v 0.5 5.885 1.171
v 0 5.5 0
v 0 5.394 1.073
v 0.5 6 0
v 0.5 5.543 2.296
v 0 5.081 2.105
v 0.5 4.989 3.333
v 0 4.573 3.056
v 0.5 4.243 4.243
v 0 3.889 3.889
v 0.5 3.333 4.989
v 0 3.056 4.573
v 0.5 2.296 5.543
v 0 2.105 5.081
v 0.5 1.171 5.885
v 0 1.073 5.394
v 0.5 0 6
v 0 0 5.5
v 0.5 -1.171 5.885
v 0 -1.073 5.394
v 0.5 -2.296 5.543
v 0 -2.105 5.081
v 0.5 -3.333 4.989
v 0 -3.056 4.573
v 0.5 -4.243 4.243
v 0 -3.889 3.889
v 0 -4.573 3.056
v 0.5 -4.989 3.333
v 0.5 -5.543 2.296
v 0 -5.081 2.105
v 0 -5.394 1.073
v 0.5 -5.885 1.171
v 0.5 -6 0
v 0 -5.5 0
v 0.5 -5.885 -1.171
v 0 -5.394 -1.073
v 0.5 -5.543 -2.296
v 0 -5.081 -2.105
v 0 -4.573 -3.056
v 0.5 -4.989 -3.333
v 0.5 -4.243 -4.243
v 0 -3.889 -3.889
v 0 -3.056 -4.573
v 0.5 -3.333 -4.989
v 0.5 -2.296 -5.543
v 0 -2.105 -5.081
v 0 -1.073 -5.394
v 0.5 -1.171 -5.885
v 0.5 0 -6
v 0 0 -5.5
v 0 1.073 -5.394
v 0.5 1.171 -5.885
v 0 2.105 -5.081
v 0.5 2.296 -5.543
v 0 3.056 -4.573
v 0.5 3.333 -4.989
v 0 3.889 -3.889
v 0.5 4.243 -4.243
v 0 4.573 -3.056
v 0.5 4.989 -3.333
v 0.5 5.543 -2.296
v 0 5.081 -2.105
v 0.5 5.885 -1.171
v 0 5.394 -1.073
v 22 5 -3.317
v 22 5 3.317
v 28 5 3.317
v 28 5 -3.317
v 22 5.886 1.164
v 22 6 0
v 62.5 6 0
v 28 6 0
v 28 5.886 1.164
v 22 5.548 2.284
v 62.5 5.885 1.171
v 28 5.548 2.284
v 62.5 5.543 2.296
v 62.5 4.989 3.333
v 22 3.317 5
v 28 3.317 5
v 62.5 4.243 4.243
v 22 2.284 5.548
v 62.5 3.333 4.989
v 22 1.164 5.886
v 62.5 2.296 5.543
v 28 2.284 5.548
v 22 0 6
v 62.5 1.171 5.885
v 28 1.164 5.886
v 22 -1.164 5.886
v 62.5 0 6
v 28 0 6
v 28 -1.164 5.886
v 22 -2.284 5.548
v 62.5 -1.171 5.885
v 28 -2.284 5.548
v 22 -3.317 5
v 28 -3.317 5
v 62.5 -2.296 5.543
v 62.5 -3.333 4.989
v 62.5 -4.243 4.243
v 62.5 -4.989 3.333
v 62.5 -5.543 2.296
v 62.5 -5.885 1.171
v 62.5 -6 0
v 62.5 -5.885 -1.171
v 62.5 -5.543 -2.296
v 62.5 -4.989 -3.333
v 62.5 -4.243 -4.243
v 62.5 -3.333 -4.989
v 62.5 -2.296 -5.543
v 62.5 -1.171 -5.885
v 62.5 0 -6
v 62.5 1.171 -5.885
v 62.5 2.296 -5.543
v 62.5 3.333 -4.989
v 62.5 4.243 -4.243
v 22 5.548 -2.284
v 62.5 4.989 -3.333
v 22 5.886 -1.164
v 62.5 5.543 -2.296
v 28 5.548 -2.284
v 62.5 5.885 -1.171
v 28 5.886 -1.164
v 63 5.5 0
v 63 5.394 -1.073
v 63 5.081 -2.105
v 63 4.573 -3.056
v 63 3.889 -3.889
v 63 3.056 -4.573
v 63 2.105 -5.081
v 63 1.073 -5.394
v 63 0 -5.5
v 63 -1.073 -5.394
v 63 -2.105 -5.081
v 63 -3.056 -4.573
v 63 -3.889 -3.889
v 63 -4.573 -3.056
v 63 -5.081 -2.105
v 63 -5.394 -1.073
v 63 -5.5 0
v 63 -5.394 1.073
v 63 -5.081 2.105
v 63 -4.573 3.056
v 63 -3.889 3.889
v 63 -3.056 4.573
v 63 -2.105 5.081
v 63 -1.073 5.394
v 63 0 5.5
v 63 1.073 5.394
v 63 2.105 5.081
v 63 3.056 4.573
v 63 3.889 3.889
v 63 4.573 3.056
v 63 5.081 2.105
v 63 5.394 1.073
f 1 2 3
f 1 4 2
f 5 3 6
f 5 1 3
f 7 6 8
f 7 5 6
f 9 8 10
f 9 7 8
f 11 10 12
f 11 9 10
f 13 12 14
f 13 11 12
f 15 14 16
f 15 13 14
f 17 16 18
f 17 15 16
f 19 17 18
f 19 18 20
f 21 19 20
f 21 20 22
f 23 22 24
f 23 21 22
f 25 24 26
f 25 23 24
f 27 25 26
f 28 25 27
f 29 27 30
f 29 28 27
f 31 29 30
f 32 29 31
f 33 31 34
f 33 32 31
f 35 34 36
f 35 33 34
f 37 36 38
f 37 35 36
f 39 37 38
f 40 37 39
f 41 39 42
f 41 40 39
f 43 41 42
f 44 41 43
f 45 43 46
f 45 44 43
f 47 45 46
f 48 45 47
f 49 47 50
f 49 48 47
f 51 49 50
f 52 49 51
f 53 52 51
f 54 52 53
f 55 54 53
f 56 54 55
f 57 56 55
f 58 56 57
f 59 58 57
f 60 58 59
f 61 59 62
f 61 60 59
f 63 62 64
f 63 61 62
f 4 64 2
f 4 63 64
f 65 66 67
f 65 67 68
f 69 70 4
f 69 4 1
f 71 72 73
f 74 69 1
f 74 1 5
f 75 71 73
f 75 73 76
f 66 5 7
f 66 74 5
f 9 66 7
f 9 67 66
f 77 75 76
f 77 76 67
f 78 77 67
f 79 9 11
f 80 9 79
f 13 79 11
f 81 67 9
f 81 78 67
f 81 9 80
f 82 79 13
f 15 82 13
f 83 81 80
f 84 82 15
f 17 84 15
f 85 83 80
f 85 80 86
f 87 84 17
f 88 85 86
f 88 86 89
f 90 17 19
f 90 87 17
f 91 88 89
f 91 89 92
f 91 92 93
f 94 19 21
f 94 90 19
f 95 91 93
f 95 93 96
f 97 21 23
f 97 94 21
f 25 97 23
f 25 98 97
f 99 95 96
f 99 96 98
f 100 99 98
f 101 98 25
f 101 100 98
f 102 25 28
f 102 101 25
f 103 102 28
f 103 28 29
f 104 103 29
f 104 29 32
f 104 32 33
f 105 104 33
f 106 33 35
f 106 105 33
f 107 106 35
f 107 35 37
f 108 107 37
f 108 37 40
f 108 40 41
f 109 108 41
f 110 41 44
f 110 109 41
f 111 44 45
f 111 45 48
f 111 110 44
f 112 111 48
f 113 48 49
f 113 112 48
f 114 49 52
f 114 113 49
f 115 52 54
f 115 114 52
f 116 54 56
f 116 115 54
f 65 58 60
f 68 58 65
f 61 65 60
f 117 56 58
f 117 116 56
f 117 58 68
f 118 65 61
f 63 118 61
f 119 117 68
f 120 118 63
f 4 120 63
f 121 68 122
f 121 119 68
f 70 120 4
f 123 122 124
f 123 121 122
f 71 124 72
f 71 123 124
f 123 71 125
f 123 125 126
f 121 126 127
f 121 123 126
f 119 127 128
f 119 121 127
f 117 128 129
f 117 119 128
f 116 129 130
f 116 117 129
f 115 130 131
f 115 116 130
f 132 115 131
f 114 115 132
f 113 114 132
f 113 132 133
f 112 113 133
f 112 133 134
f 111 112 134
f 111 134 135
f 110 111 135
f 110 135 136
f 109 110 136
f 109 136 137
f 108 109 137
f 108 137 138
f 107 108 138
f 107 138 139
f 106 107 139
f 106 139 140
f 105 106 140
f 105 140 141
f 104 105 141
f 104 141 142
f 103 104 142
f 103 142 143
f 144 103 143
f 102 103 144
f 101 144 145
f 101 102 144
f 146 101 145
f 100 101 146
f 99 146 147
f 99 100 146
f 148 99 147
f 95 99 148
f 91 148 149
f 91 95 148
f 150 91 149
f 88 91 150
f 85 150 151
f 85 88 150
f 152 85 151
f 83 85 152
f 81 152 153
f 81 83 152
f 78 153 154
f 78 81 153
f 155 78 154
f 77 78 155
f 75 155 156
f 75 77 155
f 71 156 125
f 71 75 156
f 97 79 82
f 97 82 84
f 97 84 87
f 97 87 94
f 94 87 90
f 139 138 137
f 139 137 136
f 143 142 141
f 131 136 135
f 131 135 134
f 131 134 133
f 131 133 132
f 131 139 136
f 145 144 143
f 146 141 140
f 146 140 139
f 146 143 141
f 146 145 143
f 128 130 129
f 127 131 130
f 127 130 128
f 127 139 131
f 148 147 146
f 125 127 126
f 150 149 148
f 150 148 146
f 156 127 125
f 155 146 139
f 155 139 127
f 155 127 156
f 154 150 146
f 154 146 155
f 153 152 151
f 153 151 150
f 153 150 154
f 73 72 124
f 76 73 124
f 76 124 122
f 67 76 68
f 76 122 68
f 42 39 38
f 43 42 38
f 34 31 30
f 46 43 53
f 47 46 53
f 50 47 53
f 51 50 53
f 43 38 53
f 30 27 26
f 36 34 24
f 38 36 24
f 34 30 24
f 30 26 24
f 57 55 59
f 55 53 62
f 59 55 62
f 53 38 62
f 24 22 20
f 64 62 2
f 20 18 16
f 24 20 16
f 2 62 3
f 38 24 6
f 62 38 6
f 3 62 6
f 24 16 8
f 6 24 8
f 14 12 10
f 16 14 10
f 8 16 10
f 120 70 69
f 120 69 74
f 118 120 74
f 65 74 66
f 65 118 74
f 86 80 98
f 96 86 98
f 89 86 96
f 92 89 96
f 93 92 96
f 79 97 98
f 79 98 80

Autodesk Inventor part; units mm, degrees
ref_plane "YZ Plane" through (0, 0, 0) normal (1, 0, 0) x (0, 1, 0)
ref_plane "XZ Plane" through (0, 0, 0) normal (0, 1, 0) x (-1, 0, 0)
ref_plane "XY Plane" through (0, 0, 0) normal (0, 0, 1) x (1, 0, 0)
sketch "Sketch_3" plane through (0, 0, 0) normal (0, 0, 1) x (1, 0, 0)
  line L0 (63, 0) -> (0, 0)
  line L1 (0, 0) -> (0, 5.5)
  line L2 (0, 5.5) -> (0.5, 6)
  line L3 (0.5, 6) -> (62.5, 6)
  line L4 (62.5, 6) -> (63, 5.5)
  line L5 (63, 5.5) -> (63, 0)
  line L6 (63, 0) -> (0, 0)
revolve "Revolution1" add sketch "Sketch_3" angle 360 about axis through (63, 0, 0) along (1, 0, 0)
sketch "Sketch_10" plane through (22, 0, 0) normal (1, 0, 0) x (0, 0, -1)
  line L0 (-12, 12) -> (-12, -12)
  line L1 (-12, -12) -> (-5, -12)
  line L2 (-5, -12) -> (-5, 5)
  line L3 (-5, 5) -> (12, 5)
  line L4 (12, 5) -> (12, 12)
  line L5 (12, 12) -> (-12, 12)
extrude "Extrusion1" cut sketch "Sketch_10" along normal blind 6
properties part number "PSSFG12-63-RC22"
